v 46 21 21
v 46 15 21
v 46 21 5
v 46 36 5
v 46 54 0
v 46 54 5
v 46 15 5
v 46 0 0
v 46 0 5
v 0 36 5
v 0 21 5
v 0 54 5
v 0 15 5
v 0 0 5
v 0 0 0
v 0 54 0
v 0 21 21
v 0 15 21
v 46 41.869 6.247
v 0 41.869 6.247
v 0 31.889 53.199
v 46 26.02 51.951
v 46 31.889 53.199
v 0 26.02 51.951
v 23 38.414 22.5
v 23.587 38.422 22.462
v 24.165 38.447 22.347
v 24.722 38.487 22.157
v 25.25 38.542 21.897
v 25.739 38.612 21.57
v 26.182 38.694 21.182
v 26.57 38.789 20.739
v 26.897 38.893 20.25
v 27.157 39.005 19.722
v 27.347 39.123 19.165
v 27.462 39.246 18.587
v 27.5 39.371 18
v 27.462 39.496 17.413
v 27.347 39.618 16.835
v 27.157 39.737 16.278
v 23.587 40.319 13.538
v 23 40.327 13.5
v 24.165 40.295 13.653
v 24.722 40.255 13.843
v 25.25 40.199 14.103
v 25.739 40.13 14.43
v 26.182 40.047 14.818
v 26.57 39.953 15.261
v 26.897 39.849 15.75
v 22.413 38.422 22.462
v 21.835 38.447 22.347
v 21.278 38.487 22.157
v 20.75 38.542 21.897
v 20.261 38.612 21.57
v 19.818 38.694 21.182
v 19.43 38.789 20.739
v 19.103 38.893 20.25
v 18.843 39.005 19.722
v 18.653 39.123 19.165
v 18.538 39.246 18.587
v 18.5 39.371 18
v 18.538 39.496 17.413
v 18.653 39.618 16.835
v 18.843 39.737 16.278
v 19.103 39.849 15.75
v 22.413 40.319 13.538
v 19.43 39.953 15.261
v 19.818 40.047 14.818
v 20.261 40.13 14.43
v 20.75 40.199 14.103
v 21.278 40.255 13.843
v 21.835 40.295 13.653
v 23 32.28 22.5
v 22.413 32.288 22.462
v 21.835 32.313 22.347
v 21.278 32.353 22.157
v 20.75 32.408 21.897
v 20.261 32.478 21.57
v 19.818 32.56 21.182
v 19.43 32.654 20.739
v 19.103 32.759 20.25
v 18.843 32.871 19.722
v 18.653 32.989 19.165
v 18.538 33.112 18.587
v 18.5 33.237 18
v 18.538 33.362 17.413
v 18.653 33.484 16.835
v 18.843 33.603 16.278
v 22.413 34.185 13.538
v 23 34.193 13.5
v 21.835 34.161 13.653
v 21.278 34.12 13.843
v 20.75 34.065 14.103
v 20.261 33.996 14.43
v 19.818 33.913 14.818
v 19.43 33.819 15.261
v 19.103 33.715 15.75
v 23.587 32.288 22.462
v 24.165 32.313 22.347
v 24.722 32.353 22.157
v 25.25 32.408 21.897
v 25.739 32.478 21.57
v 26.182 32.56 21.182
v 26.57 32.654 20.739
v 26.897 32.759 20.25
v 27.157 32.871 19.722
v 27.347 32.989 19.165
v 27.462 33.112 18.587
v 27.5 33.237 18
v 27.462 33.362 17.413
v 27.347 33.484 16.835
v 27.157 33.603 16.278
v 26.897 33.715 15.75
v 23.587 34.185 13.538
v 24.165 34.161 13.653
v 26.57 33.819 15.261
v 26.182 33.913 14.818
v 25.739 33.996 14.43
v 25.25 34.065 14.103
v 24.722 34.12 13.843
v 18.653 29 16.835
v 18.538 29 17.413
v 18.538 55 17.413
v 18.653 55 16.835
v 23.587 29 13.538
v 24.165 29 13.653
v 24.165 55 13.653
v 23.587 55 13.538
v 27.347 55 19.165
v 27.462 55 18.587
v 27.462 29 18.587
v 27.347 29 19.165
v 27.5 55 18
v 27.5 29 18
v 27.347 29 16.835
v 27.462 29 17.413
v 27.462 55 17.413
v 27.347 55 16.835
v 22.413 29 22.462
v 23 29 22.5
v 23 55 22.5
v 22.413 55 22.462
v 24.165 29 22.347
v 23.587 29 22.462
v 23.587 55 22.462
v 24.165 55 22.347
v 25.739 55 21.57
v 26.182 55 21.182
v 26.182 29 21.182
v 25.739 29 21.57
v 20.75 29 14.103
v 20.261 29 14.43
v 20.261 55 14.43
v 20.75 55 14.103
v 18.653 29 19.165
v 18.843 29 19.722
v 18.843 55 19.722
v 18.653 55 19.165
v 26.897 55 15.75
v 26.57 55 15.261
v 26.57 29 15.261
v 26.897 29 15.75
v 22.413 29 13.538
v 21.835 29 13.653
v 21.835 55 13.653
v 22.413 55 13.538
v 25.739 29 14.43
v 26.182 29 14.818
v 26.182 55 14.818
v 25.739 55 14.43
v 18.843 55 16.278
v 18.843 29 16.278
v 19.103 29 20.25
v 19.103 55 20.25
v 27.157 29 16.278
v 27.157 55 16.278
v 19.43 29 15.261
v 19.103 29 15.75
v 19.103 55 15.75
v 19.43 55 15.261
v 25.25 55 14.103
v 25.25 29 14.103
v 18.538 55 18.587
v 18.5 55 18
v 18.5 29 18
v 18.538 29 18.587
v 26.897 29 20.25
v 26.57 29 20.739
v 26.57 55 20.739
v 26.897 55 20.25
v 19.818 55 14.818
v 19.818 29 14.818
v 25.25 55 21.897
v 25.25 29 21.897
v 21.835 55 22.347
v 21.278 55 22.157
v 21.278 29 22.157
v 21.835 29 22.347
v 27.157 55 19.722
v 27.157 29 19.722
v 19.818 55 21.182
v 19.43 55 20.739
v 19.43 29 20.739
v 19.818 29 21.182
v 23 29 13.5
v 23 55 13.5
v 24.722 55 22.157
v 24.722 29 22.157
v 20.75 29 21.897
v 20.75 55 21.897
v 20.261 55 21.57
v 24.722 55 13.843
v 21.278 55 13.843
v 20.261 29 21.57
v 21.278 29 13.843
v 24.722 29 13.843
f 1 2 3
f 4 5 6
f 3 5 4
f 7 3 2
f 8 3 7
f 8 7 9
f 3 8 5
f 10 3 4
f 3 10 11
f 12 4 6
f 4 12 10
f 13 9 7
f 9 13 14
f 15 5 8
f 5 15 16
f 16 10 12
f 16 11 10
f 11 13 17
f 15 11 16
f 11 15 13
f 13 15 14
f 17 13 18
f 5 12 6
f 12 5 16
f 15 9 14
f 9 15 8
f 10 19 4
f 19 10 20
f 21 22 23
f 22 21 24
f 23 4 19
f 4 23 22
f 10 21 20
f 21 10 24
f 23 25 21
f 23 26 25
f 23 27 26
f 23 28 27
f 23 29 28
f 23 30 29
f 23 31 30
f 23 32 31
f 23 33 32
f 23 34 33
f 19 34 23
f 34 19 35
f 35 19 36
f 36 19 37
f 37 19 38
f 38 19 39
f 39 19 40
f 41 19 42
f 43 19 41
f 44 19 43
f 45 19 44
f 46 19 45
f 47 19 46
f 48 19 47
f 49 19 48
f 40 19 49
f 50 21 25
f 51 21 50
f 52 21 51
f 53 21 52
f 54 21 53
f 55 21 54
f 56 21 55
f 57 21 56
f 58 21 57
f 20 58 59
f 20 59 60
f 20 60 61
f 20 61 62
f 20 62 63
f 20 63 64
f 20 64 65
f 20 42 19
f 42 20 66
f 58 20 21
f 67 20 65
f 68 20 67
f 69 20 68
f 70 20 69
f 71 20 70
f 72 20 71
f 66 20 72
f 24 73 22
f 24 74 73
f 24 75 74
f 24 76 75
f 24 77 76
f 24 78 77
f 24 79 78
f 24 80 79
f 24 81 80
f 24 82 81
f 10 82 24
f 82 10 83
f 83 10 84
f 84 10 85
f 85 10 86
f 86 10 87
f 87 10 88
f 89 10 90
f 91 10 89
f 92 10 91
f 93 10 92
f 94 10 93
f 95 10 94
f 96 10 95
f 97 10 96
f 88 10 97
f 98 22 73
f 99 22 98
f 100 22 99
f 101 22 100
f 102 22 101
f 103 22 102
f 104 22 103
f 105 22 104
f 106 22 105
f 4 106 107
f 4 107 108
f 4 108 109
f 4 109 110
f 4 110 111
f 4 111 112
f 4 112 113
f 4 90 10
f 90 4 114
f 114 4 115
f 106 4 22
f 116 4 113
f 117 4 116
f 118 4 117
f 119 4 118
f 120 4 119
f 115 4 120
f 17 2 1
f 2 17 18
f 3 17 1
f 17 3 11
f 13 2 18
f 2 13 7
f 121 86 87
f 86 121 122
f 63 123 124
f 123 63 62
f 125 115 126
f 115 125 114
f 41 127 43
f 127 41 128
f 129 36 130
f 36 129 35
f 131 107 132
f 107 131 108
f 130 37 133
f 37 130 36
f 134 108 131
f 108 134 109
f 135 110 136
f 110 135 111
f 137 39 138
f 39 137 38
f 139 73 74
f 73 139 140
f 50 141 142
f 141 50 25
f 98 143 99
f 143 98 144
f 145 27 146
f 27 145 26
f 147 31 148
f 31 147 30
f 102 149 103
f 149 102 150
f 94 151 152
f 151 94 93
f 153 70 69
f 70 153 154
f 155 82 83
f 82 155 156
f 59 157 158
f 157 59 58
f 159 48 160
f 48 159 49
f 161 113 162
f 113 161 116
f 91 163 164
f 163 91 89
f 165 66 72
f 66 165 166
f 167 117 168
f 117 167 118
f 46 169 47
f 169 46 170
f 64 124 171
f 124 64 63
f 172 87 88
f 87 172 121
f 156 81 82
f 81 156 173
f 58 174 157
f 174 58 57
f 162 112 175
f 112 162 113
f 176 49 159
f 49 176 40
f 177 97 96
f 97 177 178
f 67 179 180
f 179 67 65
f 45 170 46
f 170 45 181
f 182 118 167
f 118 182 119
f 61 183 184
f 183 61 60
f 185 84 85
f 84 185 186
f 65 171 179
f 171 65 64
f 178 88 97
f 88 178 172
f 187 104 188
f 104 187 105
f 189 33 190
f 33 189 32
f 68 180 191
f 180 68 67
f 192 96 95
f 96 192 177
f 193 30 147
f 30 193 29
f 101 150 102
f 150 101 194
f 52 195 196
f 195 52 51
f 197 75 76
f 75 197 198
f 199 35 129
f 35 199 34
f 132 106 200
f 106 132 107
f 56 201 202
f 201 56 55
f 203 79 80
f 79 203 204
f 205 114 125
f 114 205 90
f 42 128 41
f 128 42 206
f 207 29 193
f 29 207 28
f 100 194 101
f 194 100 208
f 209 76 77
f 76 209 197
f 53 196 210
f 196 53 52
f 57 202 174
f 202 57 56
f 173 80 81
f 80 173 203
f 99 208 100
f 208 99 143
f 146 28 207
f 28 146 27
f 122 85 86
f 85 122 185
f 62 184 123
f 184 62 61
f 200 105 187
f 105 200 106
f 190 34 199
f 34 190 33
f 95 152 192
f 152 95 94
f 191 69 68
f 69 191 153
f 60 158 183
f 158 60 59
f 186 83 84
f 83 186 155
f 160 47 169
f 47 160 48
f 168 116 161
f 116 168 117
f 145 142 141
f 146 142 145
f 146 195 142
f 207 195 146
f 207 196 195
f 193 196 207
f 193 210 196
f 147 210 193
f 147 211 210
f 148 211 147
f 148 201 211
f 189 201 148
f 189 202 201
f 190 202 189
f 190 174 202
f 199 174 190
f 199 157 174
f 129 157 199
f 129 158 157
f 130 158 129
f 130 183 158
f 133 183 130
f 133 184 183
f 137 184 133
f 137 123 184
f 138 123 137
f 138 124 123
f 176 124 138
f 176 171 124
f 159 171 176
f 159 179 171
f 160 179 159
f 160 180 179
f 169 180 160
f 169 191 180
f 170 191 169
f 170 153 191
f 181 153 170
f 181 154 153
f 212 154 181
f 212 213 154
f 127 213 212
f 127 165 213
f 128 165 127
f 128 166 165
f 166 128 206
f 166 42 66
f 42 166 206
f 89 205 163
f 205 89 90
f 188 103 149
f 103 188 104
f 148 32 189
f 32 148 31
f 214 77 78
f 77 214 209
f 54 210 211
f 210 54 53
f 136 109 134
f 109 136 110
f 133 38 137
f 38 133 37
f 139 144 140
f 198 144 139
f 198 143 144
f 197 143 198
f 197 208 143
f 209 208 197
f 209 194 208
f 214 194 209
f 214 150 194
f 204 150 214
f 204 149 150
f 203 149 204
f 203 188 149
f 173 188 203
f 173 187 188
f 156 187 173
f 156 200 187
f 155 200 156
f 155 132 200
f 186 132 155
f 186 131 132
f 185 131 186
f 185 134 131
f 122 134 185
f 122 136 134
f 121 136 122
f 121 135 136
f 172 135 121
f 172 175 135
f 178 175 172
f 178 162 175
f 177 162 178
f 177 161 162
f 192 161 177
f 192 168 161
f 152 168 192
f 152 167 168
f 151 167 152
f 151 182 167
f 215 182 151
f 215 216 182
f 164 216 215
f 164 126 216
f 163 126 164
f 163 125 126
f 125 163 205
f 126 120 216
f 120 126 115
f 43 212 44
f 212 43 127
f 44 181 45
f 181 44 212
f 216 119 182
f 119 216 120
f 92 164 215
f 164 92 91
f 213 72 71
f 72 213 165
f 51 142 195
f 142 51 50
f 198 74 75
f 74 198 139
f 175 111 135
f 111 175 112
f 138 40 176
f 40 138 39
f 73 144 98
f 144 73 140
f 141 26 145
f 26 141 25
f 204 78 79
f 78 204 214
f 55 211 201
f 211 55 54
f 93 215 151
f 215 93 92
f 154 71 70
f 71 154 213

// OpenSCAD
// =====================================================================
//  WORKSPACE PACK  — part = "charger_dock" | "tool_rack" | "riser_leg"
//  Units mm. No supports. (riser_leg: print 2–4, lay your own board on top.)
// =====================================================================
part = "charger_dock";
$fn = 48;

// 1. Phone charging dock: leaning rest + front lip + cable channel up the back
module charger_dock() {
  cube([46, 54, 5]);                                  // base
  translate([0, 36, 5]) rotate([12,0,0]) cube([46, 6, 48]);  // back rest (leans 12°)
  translate([0, 15, 5]) cube([46, 6, 16]);            // front lip
  translate([23, 42, 18]) rotate([90,0,0]) cylinder(h = 26, r = 4.5, center = true);  // cable channel up the back
}

// 2. Wall tool / marker rack: back plate + shelf with holes
module tool_rack(n = 5) {
  W = n*16 + 12; D = 42; backH = 72; shelfT = 9; t = 4;
  difference() {
    cube([W, t, backH]);                              // back plate
    for (z = [11, backH-11]) translate([W/2, -1, z]) rotate([-90,0,0]) cylinder(h = t+2, r = 2);  // screw holes
  }
  translate([0, t, backH - shelfT - 18]) difference() {
    cube([W, D, shelfT]);
    for (i = [0:n-1]) translate([12 + i*16, D/2 + 2, -1]) cylinder(h = shelfT+2, r = 5.5);  // tool holes
  }
}

// 3. Modular monitor-riser leg (inverted-U arch): print 2–4, span with a board
module riser_leg() {
  W = 140; D = 72; H = 88; t = 12;
  difference() {
    cube([W, D, H]);
    translate([t, -1, -1]) cube([W - 2*t, D + 2, H - t]);     // hollow out the arch (open underneath)
    translate([W/2 - 30, -1, H - t - 30]) cube([60, D+2, 30]); // soften the inner top corners
  }
}

if (part == "charger_dock")   charger_dock();
else if (part == "tool_rack") tool_rack();
else if (part == "riser_leg") riser_leg();
